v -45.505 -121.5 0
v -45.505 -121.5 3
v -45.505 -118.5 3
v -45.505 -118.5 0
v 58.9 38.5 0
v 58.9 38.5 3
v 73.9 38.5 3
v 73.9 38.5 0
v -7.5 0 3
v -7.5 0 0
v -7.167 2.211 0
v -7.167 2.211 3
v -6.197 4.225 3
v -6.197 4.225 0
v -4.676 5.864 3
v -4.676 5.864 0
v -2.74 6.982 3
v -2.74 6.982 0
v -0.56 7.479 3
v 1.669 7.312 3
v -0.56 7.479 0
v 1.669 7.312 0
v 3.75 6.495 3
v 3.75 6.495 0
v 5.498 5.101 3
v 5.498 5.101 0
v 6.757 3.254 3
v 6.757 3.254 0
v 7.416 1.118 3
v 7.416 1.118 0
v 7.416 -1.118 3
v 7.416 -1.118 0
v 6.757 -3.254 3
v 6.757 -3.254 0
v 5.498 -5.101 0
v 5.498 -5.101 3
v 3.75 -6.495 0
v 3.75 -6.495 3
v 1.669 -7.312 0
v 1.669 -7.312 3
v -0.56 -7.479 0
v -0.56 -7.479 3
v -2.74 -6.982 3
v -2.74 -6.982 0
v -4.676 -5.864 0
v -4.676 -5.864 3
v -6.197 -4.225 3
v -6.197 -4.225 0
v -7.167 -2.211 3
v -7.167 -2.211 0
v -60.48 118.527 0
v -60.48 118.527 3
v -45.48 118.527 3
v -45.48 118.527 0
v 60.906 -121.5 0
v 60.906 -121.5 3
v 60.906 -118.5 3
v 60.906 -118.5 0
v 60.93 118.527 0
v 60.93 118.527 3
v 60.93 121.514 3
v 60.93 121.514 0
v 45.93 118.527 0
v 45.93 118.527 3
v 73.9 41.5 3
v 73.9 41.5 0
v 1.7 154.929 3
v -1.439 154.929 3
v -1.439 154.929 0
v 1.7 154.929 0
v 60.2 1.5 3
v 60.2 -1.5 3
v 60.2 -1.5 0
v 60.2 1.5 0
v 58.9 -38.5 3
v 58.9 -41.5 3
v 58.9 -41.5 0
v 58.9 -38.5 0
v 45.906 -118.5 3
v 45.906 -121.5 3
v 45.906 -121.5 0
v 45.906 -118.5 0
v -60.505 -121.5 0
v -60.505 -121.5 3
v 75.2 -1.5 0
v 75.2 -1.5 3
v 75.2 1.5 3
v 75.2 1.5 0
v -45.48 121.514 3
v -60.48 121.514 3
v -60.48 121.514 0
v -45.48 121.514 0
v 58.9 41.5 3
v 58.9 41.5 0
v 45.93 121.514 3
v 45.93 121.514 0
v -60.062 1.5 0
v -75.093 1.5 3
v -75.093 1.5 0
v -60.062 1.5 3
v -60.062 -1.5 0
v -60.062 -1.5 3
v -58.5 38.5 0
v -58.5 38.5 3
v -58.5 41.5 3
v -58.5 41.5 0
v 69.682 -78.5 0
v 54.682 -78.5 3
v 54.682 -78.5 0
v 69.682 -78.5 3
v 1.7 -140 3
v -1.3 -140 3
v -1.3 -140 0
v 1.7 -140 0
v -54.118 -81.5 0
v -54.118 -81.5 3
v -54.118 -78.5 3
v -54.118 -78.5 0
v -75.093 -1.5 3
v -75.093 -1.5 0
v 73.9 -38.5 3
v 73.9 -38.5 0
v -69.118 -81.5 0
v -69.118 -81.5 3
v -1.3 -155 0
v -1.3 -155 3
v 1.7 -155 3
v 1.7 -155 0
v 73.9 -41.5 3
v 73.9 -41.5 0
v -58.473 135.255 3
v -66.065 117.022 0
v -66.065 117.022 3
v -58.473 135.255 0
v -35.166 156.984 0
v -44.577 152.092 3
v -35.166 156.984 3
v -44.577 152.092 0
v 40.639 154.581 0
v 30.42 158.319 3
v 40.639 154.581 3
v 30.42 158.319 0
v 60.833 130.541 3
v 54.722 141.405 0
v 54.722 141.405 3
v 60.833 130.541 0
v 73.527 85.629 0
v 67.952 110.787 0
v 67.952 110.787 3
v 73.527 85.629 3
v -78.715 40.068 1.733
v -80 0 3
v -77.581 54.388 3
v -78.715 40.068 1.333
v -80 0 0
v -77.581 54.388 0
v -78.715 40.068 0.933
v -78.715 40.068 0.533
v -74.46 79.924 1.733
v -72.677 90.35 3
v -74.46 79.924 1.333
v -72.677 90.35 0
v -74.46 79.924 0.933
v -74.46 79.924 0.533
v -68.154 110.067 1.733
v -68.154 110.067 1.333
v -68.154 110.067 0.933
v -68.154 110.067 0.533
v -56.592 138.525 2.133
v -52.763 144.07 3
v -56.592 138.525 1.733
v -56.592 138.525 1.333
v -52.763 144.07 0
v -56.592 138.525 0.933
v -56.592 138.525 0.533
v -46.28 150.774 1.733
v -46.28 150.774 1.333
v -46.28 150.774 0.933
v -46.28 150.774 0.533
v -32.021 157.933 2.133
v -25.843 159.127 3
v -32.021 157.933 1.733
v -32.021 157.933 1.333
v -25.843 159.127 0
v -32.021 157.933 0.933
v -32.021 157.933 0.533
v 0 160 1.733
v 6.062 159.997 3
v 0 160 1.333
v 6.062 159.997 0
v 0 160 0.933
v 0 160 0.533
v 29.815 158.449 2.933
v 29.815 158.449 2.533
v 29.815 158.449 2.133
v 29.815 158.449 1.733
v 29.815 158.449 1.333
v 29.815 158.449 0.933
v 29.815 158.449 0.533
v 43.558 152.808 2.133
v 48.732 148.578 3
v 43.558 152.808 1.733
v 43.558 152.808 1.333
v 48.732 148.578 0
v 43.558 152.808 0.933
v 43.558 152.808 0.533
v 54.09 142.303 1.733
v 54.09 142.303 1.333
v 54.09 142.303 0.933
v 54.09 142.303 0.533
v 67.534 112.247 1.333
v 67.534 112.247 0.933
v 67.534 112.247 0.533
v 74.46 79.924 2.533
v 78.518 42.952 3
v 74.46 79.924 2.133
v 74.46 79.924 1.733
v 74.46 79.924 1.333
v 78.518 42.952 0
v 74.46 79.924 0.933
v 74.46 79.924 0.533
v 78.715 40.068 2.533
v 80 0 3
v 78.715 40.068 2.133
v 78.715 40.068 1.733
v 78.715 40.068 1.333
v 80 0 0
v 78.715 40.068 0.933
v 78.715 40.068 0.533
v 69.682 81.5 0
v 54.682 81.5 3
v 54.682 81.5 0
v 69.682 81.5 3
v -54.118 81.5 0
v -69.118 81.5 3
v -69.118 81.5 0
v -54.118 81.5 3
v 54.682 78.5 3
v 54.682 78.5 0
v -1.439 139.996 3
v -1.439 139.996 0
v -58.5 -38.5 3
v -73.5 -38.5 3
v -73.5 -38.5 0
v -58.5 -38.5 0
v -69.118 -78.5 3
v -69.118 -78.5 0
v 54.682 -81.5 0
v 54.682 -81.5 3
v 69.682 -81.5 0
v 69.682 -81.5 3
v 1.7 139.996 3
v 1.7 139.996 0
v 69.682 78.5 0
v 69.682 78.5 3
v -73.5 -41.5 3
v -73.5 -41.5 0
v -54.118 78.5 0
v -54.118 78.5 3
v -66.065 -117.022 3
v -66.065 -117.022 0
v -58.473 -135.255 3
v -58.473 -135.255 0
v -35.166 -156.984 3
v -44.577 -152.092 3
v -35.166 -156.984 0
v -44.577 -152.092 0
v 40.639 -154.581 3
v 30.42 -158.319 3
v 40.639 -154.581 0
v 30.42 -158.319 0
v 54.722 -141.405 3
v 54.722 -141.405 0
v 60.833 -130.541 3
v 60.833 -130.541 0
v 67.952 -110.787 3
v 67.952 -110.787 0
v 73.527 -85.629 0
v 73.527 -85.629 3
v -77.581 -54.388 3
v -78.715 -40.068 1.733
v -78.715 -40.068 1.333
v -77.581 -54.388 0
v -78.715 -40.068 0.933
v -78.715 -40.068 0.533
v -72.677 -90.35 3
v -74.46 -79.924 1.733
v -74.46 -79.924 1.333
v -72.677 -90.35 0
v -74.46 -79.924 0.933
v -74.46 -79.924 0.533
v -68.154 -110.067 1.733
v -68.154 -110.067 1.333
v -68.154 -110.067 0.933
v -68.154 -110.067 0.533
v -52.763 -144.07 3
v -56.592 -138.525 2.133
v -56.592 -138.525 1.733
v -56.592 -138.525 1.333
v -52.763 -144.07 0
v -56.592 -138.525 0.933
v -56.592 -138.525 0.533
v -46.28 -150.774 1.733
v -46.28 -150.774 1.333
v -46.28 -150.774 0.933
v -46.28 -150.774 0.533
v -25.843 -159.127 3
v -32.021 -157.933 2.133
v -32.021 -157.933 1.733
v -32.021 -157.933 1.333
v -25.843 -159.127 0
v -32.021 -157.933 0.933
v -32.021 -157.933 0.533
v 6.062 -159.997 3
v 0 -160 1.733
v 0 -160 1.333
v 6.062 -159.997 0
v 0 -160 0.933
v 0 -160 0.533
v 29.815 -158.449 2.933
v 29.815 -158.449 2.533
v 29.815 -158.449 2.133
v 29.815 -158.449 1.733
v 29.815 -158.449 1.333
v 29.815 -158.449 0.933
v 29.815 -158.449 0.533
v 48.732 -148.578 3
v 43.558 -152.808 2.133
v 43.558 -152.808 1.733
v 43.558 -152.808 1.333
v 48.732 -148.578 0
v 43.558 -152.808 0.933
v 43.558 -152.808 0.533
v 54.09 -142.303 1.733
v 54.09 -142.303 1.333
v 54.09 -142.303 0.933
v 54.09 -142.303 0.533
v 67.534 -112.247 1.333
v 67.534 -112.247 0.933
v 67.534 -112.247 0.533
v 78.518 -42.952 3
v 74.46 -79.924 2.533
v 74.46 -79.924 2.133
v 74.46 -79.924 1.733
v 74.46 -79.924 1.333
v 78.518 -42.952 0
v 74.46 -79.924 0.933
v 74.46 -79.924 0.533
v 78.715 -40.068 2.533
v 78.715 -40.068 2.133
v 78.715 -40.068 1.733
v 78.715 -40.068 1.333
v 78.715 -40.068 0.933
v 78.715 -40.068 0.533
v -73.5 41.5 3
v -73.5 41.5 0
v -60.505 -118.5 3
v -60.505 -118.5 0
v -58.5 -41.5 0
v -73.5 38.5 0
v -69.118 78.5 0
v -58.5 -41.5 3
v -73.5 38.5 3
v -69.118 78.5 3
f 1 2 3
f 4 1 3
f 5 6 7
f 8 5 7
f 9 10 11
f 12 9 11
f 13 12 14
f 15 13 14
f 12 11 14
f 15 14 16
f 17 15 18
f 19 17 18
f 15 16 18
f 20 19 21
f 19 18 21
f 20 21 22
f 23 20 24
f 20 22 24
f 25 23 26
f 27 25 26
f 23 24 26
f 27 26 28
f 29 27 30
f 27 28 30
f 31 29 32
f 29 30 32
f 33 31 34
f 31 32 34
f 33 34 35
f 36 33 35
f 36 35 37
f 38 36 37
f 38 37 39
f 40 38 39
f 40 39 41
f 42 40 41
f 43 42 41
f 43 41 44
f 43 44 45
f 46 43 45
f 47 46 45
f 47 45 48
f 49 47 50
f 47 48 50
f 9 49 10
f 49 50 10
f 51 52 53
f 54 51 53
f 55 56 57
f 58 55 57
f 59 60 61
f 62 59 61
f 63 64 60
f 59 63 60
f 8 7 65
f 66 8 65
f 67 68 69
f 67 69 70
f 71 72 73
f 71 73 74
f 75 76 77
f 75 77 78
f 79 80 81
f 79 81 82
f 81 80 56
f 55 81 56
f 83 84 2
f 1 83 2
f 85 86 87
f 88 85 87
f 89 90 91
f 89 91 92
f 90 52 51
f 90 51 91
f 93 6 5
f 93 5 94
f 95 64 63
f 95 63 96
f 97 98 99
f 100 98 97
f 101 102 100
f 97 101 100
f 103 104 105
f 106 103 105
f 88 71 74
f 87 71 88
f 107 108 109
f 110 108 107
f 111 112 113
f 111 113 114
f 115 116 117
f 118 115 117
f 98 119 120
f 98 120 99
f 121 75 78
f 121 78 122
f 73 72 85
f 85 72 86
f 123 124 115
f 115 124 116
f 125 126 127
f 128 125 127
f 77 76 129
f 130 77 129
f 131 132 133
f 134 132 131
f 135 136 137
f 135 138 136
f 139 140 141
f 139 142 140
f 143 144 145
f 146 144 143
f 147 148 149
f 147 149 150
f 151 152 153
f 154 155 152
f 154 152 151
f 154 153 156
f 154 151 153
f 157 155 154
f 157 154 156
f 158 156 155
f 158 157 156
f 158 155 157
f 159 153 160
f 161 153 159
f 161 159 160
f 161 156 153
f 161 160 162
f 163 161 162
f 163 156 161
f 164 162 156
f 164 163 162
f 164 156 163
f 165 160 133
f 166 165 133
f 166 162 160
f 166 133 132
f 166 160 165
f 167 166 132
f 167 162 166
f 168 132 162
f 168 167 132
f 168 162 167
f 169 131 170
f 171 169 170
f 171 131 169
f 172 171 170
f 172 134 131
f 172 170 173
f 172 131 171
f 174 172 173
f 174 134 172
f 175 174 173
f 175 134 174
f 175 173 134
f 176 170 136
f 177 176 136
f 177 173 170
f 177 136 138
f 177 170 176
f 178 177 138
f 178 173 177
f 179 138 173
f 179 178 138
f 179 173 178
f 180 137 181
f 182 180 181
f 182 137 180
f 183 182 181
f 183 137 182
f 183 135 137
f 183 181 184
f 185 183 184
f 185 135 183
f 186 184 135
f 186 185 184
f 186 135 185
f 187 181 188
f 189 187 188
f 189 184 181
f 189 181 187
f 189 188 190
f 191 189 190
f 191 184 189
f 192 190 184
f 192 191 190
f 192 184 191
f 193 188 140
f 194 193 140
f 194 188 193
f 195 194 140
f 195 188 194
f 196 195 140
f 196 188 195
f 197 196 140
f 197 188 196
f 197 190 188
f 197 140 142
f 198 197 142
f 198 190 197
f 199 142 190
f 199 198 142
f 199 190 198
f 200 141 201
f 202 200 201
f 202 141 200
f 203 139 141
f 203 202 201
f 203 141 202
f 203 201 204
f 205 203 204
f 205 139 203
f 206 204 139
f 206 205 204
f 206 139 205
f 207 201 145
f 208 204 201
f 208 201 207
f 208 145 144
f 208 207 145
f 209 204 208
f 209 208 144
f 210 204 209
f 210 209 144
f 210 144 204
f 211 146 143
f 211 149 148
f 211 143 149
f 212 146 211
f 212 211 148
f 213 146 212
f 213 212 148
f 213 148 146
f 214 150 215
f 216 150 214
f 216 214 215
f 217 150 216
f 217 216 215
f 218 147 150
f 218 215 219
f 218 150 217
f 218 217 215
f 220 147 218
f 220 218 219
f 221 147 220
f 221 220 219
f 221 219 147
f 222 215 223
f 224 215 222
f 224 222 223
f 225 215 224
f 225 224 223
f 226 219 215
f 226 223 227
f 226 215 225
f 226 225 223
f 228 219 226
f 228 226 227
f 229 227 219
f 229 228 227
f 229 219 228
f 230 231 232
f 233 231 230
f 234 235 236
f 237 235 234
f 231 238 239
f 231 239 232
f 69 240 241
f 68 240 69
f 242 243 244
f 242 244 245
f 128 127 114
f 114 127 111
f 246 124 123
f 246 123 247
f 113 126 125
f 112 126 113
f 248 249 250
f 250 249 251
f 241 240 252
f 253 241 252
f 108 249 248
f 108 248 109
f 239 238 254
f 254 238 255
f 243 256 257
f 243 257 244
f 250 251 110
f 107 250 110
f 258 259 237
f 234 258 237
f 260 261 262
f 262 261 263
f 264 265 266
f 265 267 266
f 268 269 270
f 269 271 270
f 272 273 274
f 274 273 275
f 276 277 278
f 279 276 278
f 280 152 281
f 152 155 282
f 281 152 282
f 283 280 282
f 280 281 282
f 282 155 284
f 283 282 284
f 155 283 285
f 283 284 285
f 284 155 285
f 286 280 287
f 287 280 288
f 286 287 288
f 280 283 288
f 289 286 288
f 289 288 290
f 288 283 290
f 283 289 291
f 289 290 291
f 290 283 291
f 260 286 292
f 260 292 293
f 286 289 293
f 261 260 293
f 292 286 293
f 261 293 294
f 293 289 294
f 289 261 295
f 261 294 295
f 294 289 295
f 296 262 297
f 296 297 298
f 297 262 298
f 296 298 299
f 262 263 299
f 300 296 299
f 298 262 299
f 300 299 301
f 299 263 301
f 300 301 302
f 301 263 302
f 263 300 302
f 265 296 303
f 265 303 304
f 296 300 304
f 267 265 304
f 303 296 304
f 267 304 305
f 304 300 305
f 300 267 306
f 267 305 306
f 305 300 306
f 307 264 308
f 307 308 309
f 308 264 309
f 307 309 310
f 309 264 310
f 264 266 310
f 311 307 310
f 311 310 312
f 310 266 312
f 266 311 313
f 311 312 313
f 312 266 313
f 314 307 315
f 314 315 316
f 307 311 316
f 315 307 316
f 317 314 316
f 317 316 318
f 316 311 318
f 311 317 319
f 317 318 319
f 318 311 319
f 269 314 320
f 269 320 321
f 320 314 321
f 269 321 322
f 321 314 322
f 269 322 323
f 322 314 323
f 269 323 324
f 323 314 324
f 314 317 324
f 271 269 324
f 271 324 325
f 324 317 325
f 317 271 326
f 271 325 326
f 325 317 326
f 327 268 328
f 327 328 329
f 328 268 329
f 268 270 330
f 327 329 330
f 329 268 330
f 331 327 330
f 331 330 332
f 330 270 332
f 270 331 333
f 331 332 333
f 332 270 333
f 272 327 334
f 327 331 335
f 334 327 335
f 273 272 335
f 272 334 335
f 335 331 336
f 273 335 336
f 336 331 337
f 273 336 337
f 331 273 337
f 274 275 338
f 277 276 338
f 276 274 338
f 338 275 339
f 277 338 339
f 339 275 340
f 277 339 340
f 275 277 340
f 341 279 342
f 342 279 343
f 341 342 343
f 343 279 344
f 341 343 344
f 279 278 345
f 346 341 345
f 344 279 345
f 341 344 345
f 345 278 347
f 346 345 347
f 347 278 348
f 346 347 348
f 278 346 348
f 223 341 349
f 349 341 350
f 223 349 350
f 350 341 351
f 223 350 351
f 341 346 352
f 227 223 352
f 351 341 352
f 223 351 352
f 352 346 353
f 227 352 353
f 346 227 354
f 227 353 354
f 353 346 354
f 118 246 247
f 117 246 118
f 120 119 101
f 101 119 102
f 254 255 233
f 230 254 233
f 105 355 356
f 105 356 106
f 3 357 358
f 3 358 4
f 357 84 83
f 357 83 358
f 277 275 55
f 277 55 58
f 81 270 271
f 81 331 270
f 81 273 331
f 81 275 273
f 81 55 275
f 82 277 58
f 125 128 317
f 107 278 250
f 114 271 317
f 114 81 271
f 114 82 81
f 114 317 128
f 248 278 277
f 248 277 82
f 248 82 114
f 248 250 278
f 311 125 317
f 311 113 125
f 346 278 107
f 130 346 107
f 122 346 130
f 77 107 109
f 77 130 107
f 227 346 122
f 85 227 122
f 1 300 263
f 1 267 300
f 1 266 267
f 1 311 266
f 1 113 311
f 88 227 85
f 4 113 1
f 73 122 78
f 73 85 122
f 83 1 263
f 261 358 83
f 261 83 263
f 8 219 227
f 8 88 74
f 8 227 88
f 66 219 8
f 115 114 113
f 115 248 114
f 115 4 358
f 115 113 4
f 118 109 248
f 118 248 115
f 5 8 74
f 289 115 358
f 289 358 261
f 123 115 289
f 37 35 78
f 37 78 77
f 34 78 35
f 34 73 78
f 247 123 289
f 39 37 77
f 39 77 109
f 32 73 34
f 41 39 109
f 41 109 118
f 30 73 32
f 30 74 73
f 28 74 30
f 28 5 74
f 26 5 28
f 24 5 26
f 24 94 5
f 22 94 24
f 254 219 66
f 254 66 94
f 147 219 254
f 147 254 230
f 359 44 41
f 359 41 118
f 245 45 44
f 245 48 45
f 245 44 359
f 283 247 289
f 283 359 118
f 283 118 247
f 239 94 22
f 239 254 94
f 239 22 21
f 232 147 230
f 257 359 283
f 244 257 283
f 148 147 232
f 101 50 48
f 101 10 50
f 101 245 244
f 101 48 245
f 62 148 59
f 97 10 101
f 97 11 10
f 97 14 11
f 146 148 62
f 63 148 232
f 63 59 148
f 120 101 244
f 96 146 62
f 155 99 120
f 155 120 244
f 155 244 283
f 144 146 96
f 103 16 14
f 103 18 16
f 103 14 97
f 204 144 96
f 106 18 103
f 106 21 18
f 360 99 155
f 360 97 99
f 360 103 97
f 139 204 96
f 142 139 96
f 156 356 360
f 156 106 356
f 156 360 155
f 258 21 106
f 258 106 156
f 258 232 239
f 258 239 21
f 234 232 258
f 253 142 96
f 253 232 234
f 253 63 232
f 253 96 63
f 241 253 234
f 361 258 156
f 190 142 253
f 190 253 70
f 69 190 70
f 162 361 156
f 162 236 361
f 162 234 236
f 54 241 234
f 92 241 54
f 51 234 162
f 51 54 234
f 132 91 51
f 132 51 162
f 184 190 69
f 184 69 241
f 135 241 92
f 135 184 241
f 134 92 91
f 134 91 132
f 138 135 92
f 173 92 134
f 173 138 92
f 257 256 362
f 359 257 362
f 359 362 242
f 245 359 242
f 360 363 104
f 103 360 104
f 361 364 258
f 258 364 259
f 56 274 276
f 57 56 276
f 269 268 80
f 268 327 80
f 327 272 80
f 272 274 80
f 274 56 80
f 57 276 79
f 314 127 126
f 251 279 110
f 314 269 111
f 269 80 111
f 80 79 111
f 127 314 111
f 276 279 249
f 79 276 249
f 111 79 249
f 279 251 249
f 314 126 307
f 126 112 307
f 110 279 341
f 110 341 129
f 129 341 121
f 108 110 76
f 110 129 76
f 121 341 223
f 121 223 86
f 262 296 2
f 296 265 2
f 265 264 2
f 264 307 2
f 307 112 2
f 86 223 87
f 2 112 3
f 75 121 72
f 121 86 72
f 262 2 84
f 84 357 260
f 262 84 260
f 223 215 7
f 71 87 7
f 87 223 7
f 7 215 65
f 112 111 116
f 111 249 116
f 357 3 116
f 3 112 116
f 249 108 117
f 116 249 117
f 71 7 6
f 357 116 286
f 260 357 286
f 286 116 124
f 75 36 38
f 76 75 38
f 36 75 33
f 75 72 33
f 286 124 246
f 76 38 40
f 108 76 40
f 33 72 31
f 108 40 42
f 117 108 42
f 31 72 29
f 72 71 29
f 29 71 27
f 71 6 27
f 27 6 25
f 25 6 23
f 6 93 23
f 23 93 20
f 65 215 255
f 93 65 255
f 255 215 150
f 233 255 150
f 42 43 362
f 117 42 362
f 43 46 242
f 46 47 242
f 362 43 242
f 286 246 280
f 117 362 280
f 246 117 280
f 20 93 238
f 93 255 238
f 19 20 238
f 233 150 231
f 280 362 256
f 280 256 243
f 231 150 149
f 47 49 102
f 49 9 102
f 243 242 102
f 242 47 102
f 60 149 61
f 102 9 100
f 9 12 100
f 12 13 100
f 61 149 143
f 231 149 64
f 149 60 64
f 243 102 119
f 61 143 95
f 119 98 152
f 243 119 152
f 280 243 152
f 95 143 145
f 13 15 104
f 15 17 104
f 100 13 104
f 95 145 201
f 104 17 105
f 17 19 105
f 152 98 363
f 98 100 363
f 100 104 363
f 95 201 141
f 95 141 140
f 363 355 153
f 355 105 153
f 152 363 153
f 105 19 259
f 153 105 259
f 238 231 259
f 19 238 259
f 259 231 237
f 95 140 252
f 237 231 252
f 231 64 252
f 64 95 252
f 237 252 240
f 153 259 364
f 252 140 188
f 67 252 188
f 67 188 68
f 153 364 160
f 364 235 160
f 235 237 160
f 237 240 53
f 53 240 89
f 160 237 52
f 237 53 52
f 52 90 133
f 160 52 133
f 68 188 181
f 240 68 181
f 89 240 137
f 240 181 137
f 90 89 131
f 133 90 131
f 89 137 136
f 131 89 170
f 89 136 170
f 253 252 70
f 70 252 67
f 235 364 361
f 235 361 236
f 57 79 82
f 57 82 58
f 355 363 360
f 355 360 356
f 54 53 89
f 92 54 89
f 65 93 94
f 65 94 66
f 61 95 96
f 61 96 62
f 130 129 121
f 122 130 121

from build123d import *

# Parameters (mm, degrees)
EXTRUDE_1_DEPTH     = 3
SKETCH_3_W          = 3
SKETCH_3_H          = 15.000000006
SKETCH_3_W_2        = 15
SKETCH_3_H_2        = 3
SKETCH_3_W_3        = 15.00000006
SKETCH_3_W_4        = 15.031285664
SKETCH_3_H_3        = 2.98728904
SKETCH_3_W_5        = 3.139363819
SKETCH_3_H_4        = 14.933559722
CUT_EXTRUDE_1_DEPTH = 3
SKETCH_5_W          = 14.999999994
SKETCH_5_H          = 3
SKETCH_5_W_2        = 14.999999996
CUT_EXTRUDE_2_DEPTH = 3
SKETCH_7_R          = 7.5
CUT_EXTRUDE_3_DEPTH = 3


with BuildPart() as part:
    # 草图1 → 凸台-拉伸1 (new body)
    with BuildSketch(Plane.XY):
        with BuildLine():
            add(Edge.make_bspline(
                [(-80, 0), (-79.999999517, 6.699503197), (-79.813334657, 20.06627682), (-78.975827788, 40.103014347), (-76.900551884, 63.409443582), (-74.129426691, 83.257436743), (-71.298088169, 97.696692105), (-69.099286902, 106.811990018), (-66.70859783, 115.203996028), (-64.48936494, 121.902634073), (-61.776675321, 128.772853984), (-58.610309744, 135.208894491), (-55.748361383, 140.038637222), (-52.417983516, 144.692160649), (-48.644443211, 148.932654926), (-43.90188816, 152.895684545), (-38.638941508, 155.797422808), (-33.774046499, 157.55150664), (-29.437897495, 158.586138347), (-25.733934467, 159.185337458), (-22.051769463, 159.569060425), (-18.406326982, 159.797581877), (-14.053201072, 159.945194341), (-8.994603761, 159.999951963), (-3.232699743, 159.999952561), (3.232699743, 159.999952561), (8.994603761, 159.999951963), (14.053201071, 159.945194341), (18.406326982, 159.797581876), (22.051769464, 159.569060426), (25.733934469, 159.185337459), (29.437897495, 158.586138348), (33.77404647, 157.551506616), (38.638941617, 155.797422901), (43.901887855, 152.895684285), (48.644443968, 148.932655572), (52.417981042, 144.69215854), (55.748370939, 140.038645368), (58.610273081, 135.208863236), (61.776779921, 128.772943152), (64.4891488, 121.90244982), (66.709010037, 115.204347422), (70.013773512, 103.597451909), (73.433491394, 87.895578262), (76.604717125, 66.739177323), (78.975439873, 40.102683662), (79.813498867, 20.066416803), (79.999999517, 6.699503197), (80, 0)],
                knots=[0, 0, 0, 0, 0, 0.06499261, 0.129673422, 0.194485365, 0.226896468, 0.259307571, 0.272363931, 0.28542029, 0.311533009, 0.327739051, 0.343945093, 0.35493768, 0.365930268, 0.383191166, 0.398872304, 0.414552278, 0.42388233, 0.433212383, 0.442069116, 0.450925849, 0.459782581, 0.468639314, 0.484319657, 0.5, 0.515680343, 0.531360686, 0.540217419, 0.549074151, 0.557930884, 0.566787617, 0.57611767, 0.585447722, 0.601127696, 0.616808834, 0.634069732, 0.64506232, 0.656054907, 0.672260949, 0.688466991, 0.71457971, 0.727636069, 0.740692429, 0.805514635, 0.870326578, 0.93500739, 1, 1, 1, 1, 1], degree=4))
            add(Edge.make_bspline(
                [(-80, 0), (-79.999999517, -6.699503197), (-79.813334657, -20.06627682), (-78.975827788, -40.103014347), (-76.900551884, -63.409443582), (-74.129426691, -83.257436743), (-71.298088169, -97.696692105), (-69.099286902, -106.811990018), (-66.70859783, -115.203996028), (-64.48936494, -121.902634073), (-61.776675321, -128.772853984), (-58.610309744, -135.208894491), (-55.748361383, -140.038637222), (-52.417983516, -144.692160649), (-48.644443211, -148.932654926), (-43.90188816, -152.895684545), (-38.638941508, -155.797422808), (-33.774046499, -157.55150664), (-29.437897495, -158.586138347), (-25.733934467, -159.185337458), (-22.051769463, -159.569060425), (-18.406326982, -159.797581877), (-14.053201072, -159.945194341), (-8.994603761, -159.999951963), (-3.232699743, -159.999952561), (3.232699743, -159.999952561), (8.994603761, -159.999951963), (14.053201071, -159.945194341), (18.406326982, -159.797581876), (22.051769464, -159.569060426), (25.733934469, -159.185337459), (29.437897495, -158.586138348), (33.77404647, -157.551506616), (38.638941617, -155.797422901), (43.901887855, -152.895684285), (48.644443968, -148.932655572), (52.417981042, -144.69215854), (55.748370939, -140.038645368), (58.610273081, -135.208863236), (61.776779921, -128.772943152), (64.4891488, -121.90244982), (66.709010037, -115.204347422), (70.013773512, -103.597451909), (73.433491394, -87.895578262), (76.604717125, -66.739177323), (78.975439873, -40.102683662), (79.813498867, -20.066416803), (79.999999517, -6.699503197), (80, 0)],
                knots=[0, 0, 0, 0, 0, 0.06499261, 0.129673422, 0.194485365, 0.226896468, 0.259307571, 0.272363931, 0.28542029, 0.311533009, 0.327739051, 0.343945093, 0.35493768, 0.365930268, 0.383191166, 0.398872304, 0.414552278, 0.42388233, 0.433212383, 0.442069116, 0.450925849, 0.459782581, 0.468639314, 0.484319657, 0.5, 0.515680343, 0.531360686, 0.540217419, 0.549074151, 0.557930884, 0.566787617, 0.57611767, 0.585447722, 0.601127696, 0.616808834, 0.634069732, 0.64506232, 0.656054907, 0.672260949, 0.688466991, 0.71457971, 0.727636069, 0.740692429, 0.805514635, 0.870326578, 0.93500739, 1, 1, 1, 1, 1], degree=4))
        make_face()
    extrude(amount=EXTRUDE_1_DEPTH)

    # 草图3 → 切除-拉伸1 (cut)
    with BuildSketch(Plane.XY.offset(3)):
        with Locations((0.200366681, -147.500000003)):
            Rectangle(SKETCH_3_W, SKETCH_3_H)
        with Locations((53.405563639, -119.999999996)):
            Rectangle(SKETCH_3_W_2, SKETCH_3_H_2)
        with Locations((-53.004830277, -119.999999996)):
            Rectangle(SKETCH_3_W_2, SKETCH_3_H_2)
        with Locations((-65.999633294, -40.000000001)):
            Rectangle(SKETCH_3_W_2, SKETCH_3_H_2)
        with Locations((66.400366657, -40.000000001)):
            Rectangle(SKETCH_3_W_2, SKETCH_3_H_2)
        with Locations((67.700366711, 1e-09)):
            Rectangle(SKETCH_3_W_3, SKETCH_3_H_2)
        with Locations((66.400366657, 40.000000004)):
            Rectangle(SKETCH_3_W_2, SKETCH_3_H_2)
        with Locations((-67.577742522, 0)):
            Rectangle(SKETCH_3_W_4, SKETCH_3_H_2)
        with Locations((-65.999633294, 40.000000004)):
            Rectangle(SKETCH_3_W_2, SKETCH_3_H_2)
        with Locations((-52.980078329, 120.020205938)):
            Rectangle(SKETCH_3_W_2, SKETCH_3_H_3)
        with Locations((53.430315586, 120.020205938)):
            Rectangle(SKETCH_3_W_2, SKETCH_3_H_3)
        with Locations((0.130684772, 147.462472771)):
            Rectangle(SKETCH_3_W_5, SKETCH_3_H_4)
    extrude(amount=-CUT_EXTRUDE_1_DEPTH, mode=Mode.SUBTRACT)

    # 草图5 → 切除-拉伸2 (cut)
    with BuildSketch(Plane.XY.offset(3)):
        with Locations((-61.617760231, -80.000000002)):
            Rectangle(SKETCH_5_W, SKETCH_5_H)
        with Locations((62.182239751, -80.000000002)):
            Rectangle(SKETCH_5_W_2, SKETCH_5_H)
        with Locations((62.182239751, 80.000000005)):
            Rectangle(SKETCH_5_W_2, SKETCH_5_H)
        with Locations((-61.617760231, 80.000000005)):
            Rectangle(SKETCH_5_W, SKETCH_5_H)
    extrude(amount=-CUT_EXTRUDE_2_DEPTH, mode=Mode.SUBTRACT)

    # 草图7 → 切除-拉伸3 (cut)
    with BuildSketch(Plane(origin=(0, 0, 0), x_dir=(-1, 0, 0), z_dir=(0, 0, -1))):
        Circle(SKETCH_7_R)
    extrude(amount=-CUT_EXTRUDE_3_DEPTH, mode=Mode.SUBTRACT)


solid = part.part
